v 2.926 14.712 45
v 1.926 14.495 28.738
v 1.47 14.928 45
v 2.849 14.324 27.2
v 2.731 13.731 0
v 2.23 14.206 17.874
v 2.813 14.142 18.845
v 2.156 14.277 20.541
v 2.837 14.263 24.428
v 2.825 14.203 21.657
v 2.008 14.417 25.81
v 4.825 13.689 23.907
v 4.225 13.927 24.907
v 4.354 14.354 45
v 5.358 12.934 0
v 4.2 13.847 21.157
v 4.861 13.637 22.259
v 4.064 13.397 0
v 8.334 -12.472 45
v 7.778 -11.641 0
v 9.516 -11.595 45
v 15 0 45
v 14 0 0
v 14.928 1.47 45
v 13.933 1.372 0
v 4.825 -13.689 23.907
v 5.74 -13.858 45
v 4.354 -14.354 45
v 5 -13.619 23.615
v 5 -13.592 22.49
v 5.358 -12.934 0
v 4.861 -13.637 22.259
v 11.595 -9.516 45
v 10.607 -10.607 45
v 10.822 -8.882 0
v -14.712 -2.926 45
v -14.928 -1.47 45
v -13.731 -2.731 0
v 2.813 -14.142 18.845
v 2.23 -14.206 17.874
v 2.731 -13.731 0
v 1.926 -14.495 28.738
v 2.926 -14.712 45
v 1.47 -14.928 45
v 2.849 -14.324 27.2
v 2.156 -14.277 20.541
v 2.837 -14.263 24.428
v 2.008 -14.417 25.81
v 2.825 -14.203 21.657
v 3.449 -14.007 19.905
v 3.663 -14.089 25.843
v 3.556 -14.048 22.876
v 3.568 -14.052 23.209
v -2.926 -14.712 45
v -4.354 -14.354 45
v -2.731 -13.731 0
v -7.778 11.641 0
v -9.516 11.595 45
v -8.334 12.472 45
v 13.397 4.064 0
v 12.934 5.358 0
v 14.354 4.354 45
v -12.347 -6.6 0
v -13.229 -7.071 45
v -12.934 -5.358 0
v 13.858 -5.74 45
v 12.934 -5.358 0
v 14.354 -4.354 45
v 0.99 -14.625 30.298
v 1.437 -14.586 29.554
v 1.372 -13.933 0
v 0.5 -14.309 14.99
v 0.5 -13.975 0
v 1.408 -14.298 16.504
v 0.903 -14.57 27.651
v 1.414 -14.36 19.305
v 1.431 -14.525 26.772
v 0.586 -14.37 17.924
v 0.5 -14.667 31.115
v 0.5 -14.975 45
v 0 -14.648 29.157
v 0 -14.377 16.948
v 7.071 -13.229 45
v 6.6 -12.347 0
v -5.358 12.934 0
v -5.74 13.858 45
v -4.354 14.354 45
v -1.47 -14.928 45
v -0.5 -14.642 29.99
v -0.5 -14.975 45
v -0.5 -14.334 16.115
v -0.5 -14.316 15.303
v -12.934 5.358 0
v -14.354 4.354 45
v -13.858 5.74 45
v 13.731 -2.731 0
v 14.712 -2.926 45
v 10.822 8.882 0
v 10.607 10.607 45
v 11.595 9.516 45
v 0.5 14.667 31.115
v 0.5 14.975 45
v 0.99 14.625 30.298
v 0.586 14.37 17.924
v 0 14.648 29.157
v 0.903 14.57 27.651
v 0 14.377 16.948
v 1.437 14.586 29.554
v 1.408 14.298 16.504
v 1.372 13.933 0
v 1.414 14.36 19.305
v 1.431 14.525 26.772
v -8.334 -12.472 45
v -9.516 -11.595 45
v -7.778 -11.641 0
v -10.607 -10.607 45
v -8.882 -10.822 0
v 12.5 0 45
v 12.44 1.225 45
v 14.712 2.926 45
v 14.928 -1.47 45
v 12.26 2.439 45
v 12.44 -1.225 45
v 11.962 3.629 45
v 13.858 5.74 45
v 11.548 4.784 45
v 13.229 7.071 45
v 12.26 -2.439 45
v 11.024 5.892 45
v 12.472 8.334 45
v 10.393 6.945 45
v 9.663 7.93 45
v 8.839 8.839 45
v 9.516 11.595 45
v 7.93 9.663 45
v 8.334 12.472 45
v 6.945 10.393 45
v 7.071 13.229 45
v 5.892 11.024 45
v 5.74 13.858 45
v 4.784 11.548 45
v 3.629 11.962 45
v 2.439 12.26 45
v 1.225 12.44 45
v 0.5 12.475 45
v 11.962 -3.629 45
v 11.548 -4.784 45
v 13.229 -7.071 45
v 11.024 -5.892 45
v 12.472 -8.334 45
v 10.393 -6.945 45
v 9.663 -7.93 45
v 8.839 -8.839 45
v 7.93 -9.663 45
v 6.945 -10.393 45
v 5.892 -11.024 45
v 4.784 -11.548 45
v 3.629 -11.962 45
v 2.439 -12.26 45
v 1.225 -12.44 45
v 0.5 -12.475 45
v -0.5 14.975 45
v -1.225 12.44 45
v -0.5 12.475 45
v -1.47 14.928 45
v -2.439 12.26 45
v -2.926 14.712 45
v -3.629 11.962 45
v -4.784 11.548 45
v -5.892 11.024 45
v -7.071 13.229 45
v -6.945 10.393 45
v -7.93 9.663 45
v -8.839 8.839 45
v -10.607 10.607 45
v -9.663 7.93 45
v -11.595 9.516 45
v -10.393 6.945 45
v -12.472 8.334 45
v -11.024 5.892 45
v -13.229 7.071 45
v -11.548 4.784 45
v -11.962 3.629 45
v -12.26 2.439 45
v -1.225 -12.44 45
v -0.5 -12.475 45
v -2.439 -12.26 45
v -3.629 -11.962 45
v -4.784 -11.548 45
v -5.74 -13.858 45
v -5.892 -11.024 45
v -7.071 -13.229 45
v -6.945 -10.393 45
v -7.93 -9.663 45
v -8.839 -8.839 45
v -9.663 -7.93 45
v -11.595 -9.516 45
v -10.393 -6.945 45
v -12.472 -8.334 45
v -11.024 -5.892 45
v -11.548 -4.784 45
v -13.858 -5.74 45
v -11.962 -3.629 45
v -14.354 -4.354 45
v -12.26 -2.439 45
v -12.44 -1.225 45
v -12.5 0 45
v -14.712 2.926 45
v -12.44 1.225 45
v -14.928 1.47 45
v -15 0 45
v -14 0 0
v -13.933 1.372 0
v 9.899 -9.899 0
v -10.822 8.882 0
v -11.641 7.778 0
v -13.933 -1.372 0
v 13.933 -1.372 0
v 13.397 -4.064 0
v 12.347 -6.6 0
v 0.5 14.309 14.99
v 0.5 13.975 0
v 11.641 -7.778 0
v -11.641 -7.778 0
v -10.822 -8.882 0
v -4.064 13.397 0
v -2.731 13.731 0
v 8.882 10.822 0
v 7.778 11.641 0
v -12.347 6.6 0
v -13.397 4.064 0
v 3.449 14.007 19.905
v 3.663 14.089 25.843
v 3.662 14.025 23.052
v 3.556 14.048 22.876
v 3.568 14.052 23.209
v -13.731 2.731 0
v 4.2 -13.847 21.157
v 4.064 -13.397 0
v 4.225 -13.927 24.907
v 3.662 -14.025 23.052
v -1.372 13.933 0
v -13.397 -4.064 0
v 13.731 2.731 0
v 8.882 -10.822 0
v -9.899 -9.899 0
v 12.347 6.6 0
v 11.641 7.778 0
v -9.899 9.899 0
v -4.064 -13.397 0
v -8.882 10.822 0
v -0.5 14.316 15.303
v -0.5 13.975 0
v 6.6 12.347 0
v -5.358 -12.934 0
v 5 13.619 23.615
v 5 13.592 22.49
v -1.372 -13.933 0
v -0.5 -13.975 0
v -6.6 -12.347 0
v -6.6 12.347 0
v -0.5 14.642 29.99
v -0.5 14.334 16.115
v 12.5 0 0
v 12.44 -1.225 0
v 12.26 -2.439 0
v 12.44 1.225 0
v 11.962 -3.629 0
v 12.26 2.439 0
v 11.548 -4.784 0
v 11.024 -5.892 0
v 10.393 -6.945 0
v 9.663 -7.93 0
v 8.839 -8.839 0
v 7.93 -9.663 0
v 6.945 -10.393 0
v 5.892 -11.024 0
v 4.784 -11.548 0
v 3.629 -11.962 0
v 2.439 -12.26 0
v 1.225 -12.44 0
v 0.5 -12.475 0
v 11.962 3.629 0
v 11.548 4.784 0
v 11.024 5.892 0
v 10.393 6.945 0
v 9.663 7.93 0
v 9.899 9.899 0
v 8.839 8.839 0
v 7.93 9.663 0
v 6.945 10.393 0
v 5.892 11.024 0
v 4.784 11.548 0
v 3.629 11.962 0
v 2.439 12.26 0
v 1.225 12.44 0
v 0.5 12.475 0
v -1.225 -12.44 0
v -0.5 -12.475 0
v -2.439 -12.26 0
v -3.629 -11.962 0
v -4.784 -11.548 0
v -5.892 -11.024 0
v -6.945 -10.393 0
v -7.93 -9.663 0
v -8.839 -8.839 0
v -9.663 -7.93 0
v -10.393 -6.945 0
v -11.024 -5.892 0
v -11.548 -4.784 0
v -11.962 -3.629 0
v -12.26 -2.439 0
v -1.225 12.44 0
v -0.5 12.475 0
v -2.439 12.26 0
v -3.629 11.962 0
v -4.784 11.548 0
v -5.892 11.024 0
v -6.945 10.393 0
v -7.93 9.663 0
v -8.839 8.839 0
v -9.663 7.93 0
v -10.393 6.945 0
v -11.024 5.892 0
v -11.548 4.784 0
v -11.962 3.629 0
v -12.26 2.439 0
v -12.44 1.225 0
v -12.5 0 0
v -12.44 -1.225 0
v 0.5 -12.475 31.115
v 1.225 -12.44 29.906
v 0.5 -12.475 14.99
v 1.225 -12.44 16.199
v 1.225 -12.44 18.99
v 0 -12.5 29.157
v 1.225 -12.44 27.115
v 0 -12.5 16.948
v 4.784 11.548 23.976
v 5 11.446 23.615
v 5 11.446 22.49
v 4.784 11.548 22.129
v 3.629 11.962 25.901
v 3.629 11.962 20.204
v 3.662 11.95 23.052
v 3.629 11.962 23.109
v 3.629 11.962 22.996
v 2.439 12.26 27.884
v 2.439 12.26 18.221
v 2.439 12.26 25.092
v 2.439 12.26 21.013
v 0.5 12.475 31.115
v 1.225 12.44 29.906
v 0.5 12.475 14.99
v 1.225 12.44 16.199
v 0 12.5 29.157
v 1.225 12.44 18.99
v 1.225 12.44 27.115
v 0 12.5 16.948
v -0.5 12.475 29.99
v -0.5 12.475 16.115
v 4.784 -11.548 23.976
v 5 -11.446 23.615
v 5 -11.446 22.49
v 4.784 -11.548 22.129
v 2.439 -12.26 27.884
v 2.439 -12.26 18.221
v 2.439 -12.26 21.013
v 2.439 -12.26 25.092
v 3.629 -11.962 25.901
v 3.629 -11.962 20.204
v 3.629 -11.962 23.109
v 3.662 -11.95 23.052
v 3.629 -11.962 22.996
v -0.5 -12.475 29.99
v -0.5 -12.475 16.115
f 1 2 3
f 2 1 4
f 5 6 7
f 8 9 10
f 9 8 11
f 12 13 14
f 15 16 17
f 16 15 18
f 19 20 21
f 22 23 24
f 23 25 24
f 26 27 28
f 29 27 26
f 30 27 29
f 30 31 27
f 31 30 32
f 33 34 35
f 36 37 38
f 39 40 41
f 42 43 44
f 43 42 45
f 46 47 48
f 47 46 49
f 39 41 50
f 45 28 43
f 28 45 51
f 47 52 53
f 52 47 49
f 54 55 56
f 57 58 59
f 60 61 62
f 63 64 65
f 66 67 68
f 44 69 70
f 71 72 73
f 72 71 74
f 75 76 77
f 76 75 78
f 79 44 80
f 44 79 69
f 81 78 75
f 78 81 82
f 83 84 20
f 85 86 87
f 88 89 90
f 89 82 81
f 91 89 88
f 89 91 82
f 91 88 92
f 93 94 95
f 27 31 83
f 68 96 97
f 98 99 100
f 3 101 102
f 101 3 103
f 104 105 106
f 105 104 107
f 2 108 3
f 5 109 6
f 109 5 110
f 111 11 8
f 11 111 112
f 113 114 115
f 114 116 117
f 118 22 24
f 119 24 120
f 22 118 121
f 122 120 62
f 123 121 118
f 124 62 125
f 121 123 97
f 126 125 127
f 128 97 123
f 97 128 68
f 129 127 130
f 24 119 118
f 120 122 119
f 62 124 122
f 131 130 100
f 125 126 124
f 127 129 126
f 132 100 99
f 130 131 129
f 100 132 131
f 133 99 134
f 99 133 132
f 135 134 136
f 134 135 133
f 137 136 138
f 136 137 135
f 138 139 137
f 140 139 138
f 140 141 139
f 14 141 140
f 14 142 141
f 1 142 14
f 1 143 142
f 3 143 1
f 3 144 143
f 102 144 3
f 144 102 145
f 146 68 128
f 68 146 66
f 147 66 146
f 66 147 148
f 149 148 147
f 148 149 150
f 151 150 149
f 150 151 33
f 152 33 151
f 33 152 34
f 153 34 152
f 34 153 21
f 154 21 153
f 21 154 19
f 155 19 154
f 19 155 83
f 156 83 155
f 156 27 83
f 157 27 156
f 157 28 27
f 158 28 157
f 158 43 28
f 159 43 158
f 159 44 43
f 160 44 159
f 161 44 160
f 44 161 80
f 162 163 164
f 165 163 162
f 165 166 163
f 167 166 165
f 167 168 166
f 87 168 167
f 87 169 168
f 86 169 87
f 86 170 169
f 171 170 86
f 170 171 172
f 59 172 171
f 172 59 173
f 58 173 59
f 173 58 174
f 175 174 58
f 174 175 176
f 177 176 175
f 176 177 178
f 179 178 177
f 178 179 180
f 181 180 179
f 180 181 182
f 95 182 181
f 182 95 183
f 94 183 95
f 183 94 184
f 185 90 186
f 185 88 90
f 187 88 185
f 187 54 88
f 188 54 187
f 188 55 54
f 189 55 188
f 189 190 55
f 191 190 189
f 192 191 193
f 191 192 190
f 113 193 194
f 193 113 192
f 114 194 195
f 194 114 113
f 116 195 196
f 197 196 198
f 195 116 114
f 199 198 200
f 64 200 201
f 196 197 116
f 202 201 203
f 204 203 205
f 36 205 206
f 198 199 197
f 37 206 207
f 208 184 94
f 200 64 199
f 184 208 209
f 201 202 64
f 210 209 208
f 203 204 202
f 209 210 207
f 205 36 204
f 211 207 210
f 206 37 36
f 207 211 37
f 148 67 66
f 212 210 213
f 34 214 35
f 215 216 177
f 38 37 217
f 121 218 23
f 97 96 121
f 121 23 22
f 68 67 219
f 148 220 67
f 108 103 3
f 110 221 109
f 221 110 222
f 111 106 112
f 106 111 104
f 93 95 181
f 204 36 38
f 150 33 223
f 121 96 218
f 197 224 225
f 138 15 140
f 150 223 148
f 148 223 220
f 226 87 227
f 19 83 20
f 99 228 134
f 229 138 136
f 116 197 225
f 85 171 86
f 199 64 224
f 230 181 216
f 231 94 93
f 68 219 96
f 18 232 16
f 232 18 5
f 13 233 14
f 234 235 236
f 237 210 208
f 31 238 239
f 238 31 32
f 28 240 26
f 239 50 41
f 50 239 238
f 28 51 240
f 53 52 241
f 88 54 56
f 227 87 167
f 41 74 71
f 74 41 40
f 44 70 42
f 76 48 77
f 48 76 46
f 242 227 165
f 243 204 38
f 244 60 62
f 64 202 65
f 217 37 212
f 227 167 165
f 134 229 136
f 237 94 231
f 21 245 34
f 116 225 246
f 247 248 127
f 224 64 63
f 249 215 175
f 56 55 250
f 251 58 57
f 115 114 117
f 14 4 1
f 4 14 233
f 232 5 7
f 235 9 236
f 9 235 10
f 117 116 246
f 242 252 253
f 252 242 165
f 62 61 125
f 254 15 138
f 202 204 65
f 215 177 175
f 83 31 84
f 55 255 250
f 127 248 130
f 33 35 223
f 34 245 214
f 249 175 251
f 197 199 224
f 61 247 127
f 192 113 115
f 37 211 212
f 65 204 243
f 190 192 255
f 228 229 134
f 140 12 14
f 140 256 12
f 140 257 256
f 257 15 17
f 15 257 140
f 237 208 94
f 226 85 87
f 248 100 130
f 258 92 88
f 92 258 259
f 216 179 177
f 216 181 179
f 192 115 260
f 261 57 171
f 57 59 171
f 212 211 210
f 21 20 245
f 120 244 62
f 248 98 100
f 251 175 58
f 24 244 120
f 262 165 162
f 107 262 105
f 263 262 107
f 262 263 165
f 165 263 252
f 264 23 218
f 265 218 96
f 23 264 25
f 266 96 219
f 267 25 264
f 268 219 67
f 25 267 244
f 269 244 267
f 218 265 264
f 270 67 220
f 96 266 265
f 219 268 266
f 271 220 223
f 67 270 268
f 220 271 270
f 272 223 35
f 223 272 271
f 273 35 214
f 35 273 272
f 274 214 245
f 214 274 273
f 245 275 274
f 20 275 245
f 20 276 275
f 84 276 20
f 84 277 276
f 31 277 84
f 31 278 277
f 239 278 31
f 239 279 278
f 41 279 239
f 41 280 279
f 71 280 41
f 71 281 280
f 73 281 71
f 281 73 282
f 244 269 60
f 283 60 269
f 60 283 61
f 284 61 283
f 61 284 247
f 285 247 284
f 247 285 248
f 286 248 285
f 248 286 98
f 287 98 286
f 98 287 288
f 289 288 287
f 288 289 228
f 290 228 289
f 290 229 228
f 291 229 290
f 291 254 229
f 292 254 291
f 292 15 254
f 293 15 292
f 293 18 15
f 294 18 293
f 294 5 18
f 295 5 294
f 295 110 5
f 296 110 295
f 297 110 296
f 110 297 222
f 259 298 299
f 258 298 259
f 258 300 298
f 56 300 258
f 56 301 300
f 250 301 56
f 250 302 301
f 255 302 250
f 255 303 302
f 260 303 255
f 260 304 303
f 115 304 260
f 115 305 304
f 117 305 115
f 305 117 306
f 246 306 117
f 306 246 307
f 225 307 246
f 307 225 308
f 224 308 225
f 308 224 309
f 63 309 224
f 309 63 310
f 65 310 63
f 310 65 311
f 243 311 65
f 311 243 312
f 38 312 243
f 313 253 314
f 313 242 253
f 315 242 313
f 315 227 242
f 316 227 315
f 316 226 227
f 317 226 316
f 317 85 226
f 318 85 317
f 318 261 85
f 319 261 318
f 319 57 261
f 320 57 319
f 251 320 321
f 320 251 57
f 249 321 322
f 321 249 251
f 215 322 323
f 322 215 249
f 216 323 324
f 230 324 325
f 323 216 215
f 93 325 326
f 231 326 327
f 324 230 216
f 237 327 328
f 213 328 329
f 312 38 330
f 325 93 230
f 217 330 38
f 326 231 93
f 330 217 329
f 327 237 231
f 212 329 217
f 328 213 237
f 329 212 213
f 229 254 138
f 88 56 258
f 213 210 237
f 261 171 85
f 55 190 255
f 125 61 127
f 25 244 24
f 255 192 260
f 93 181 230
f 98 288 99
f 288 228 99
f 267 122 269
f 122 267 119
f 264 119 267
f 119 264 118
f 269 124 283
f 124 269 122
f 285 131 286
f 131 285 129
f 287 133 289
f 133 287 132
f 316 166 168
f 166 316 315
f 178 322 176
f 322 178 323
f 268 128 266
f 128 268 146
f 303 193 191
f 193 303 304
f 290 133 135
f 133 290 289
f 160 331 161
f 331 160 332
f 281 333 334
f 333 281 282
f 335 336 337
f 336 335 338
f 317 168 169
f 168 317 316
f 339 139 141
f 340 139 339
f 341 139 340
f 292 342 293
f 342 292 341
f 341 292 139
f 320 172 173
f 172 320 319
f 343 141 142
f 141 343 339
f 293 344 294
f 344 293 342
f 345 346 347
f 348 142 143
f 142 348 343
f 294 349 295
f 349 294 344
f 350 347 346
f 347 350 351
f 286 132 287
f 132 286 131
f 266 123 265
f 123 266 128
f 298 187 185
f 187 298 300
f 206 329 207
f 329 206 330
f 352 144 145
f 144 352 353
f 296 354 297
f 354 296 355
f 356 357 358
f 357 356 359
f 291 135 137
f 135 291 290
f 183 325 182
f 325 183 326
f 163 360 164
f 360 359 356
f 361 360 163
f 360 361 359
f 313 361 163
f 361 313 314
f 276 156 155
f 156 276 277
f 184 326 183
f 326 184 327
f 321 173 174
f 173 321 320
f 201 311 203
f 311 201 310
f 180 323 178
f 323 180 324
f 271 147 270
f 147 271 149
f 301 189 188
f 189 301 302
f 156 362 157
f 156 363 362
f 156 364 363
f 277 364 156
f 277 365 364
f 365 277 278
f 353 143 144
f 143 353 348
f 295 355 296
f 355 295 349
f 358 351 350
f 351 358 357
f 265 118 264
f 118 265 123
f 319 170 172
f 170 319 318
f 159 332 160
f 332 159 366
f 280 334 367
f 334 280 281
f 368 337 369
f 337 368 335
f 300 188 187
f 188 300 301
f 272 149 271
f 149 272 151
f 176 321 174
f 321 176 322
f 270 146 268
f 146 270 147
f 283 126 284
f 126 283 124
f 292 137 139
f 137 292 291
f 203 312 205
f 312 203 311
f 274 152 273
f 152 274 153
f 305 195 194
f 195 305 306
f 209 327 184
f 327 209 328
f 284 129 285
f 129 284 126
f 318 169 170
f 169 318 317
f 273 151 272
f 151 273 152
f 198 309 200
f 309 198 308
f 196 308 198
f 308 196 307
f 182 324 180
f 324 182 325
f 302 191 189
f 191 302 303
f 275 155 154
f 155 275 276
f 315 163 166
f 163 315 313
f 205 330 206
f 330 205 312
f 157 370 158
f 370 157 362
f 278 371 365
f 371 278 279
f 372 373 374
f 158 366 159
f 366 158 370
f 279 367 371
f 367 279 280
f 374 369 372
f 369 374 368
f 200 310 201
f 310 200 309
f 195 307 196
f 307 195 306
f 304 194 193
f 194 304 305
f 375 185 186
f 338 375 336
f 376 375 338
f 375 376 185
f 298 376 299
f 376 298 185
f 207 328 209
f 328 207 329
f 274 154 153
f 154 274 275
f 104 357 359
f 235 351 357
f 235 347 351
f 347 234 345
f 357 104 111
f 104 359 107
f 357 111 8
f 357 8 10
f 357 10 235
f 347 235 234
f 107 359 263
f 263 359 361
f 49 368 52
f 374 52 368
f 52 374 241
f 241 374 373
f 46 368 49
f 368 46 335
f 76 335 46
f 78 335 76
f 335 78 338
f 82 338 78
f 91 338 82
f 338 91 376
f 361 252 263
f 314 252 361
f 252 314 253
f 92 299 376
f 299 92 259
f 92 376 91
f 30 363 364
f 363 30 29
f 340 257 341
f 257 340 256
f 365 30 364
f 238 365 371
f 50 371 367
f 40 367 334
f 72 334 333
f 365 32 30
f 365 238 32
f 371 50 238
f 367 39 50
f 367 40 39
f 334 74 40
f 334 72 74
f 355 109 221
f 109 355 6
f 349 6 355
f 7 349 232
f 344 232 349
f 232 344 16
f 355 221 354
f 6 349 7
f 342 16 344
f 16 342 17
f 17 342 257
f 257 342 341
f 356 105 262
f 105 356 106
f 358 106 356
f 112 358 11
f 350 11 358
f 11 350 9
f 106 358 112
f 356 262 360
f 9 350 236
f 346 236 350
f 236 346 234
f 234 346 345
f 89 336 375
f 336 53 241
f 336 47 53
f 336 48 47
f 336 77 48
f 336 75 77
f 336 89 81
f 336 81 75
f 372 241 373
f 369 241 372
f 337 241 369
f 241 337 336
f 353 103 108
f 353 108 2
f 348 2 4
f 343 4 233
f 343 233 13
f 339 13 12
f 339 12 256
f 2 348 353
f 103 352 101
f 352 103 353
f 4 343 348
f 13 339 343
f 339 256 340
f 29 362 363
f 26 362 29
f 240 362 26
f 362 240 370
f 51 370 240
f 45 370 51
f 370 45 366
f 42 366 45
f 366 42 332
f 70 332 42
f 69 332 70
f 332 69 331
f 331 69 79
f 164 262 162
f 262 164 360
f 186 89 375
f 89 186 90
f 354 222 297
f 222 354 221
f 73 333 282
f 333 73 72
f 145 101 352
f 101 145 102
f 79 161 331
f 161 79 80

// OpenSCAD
$fn = 64;

module tube() {
    height = 45;
    // Inner & Outer Diameters, upper / lower
    id = 12.5;
    od_u =15;
    od_l = 14;
    // Floating point imprecision compensation constant
    f = 0.01;
    difference() {
        // shell
        cylinder(height, od_l, od_u);
        // cutout
        translate([0,0,-f]) {
            cylinder(height+2*f, id, id);
        }
    }
}

/// Wedge with internal locking ring
/// 
/// @param zoff - Offset of locking ring from x/y plane
module shell (zoff) {
    union() {
        tube();
        //todo
    }
}

module slit (tolerance, length, x, z) {
    translate([x, 0, length/2+z]) {
        cube([tolerance, 40, length], center = true);
    }
}

module cutouts(f, height) {
    color("tomato") {
        union() {
            slit(1,height/3+f,0,-f);
            union() {
                hull() {
                    slit(1,height/40,0,-f+height/3);
                    slit(1,height/40,height/10,height/3*1.5-f);
                }
                hull() {
                    slit(1,height/40,height/10,height/3*1.5-f);
                    slit(1,height/40,0,-f+height/3*2);
                }
            }
            slit(1,height/3,0,-f+height/3*2+2*f);
        }
    }
}

difference() {
    shell();
    cutouts(0.01, 45);
}
